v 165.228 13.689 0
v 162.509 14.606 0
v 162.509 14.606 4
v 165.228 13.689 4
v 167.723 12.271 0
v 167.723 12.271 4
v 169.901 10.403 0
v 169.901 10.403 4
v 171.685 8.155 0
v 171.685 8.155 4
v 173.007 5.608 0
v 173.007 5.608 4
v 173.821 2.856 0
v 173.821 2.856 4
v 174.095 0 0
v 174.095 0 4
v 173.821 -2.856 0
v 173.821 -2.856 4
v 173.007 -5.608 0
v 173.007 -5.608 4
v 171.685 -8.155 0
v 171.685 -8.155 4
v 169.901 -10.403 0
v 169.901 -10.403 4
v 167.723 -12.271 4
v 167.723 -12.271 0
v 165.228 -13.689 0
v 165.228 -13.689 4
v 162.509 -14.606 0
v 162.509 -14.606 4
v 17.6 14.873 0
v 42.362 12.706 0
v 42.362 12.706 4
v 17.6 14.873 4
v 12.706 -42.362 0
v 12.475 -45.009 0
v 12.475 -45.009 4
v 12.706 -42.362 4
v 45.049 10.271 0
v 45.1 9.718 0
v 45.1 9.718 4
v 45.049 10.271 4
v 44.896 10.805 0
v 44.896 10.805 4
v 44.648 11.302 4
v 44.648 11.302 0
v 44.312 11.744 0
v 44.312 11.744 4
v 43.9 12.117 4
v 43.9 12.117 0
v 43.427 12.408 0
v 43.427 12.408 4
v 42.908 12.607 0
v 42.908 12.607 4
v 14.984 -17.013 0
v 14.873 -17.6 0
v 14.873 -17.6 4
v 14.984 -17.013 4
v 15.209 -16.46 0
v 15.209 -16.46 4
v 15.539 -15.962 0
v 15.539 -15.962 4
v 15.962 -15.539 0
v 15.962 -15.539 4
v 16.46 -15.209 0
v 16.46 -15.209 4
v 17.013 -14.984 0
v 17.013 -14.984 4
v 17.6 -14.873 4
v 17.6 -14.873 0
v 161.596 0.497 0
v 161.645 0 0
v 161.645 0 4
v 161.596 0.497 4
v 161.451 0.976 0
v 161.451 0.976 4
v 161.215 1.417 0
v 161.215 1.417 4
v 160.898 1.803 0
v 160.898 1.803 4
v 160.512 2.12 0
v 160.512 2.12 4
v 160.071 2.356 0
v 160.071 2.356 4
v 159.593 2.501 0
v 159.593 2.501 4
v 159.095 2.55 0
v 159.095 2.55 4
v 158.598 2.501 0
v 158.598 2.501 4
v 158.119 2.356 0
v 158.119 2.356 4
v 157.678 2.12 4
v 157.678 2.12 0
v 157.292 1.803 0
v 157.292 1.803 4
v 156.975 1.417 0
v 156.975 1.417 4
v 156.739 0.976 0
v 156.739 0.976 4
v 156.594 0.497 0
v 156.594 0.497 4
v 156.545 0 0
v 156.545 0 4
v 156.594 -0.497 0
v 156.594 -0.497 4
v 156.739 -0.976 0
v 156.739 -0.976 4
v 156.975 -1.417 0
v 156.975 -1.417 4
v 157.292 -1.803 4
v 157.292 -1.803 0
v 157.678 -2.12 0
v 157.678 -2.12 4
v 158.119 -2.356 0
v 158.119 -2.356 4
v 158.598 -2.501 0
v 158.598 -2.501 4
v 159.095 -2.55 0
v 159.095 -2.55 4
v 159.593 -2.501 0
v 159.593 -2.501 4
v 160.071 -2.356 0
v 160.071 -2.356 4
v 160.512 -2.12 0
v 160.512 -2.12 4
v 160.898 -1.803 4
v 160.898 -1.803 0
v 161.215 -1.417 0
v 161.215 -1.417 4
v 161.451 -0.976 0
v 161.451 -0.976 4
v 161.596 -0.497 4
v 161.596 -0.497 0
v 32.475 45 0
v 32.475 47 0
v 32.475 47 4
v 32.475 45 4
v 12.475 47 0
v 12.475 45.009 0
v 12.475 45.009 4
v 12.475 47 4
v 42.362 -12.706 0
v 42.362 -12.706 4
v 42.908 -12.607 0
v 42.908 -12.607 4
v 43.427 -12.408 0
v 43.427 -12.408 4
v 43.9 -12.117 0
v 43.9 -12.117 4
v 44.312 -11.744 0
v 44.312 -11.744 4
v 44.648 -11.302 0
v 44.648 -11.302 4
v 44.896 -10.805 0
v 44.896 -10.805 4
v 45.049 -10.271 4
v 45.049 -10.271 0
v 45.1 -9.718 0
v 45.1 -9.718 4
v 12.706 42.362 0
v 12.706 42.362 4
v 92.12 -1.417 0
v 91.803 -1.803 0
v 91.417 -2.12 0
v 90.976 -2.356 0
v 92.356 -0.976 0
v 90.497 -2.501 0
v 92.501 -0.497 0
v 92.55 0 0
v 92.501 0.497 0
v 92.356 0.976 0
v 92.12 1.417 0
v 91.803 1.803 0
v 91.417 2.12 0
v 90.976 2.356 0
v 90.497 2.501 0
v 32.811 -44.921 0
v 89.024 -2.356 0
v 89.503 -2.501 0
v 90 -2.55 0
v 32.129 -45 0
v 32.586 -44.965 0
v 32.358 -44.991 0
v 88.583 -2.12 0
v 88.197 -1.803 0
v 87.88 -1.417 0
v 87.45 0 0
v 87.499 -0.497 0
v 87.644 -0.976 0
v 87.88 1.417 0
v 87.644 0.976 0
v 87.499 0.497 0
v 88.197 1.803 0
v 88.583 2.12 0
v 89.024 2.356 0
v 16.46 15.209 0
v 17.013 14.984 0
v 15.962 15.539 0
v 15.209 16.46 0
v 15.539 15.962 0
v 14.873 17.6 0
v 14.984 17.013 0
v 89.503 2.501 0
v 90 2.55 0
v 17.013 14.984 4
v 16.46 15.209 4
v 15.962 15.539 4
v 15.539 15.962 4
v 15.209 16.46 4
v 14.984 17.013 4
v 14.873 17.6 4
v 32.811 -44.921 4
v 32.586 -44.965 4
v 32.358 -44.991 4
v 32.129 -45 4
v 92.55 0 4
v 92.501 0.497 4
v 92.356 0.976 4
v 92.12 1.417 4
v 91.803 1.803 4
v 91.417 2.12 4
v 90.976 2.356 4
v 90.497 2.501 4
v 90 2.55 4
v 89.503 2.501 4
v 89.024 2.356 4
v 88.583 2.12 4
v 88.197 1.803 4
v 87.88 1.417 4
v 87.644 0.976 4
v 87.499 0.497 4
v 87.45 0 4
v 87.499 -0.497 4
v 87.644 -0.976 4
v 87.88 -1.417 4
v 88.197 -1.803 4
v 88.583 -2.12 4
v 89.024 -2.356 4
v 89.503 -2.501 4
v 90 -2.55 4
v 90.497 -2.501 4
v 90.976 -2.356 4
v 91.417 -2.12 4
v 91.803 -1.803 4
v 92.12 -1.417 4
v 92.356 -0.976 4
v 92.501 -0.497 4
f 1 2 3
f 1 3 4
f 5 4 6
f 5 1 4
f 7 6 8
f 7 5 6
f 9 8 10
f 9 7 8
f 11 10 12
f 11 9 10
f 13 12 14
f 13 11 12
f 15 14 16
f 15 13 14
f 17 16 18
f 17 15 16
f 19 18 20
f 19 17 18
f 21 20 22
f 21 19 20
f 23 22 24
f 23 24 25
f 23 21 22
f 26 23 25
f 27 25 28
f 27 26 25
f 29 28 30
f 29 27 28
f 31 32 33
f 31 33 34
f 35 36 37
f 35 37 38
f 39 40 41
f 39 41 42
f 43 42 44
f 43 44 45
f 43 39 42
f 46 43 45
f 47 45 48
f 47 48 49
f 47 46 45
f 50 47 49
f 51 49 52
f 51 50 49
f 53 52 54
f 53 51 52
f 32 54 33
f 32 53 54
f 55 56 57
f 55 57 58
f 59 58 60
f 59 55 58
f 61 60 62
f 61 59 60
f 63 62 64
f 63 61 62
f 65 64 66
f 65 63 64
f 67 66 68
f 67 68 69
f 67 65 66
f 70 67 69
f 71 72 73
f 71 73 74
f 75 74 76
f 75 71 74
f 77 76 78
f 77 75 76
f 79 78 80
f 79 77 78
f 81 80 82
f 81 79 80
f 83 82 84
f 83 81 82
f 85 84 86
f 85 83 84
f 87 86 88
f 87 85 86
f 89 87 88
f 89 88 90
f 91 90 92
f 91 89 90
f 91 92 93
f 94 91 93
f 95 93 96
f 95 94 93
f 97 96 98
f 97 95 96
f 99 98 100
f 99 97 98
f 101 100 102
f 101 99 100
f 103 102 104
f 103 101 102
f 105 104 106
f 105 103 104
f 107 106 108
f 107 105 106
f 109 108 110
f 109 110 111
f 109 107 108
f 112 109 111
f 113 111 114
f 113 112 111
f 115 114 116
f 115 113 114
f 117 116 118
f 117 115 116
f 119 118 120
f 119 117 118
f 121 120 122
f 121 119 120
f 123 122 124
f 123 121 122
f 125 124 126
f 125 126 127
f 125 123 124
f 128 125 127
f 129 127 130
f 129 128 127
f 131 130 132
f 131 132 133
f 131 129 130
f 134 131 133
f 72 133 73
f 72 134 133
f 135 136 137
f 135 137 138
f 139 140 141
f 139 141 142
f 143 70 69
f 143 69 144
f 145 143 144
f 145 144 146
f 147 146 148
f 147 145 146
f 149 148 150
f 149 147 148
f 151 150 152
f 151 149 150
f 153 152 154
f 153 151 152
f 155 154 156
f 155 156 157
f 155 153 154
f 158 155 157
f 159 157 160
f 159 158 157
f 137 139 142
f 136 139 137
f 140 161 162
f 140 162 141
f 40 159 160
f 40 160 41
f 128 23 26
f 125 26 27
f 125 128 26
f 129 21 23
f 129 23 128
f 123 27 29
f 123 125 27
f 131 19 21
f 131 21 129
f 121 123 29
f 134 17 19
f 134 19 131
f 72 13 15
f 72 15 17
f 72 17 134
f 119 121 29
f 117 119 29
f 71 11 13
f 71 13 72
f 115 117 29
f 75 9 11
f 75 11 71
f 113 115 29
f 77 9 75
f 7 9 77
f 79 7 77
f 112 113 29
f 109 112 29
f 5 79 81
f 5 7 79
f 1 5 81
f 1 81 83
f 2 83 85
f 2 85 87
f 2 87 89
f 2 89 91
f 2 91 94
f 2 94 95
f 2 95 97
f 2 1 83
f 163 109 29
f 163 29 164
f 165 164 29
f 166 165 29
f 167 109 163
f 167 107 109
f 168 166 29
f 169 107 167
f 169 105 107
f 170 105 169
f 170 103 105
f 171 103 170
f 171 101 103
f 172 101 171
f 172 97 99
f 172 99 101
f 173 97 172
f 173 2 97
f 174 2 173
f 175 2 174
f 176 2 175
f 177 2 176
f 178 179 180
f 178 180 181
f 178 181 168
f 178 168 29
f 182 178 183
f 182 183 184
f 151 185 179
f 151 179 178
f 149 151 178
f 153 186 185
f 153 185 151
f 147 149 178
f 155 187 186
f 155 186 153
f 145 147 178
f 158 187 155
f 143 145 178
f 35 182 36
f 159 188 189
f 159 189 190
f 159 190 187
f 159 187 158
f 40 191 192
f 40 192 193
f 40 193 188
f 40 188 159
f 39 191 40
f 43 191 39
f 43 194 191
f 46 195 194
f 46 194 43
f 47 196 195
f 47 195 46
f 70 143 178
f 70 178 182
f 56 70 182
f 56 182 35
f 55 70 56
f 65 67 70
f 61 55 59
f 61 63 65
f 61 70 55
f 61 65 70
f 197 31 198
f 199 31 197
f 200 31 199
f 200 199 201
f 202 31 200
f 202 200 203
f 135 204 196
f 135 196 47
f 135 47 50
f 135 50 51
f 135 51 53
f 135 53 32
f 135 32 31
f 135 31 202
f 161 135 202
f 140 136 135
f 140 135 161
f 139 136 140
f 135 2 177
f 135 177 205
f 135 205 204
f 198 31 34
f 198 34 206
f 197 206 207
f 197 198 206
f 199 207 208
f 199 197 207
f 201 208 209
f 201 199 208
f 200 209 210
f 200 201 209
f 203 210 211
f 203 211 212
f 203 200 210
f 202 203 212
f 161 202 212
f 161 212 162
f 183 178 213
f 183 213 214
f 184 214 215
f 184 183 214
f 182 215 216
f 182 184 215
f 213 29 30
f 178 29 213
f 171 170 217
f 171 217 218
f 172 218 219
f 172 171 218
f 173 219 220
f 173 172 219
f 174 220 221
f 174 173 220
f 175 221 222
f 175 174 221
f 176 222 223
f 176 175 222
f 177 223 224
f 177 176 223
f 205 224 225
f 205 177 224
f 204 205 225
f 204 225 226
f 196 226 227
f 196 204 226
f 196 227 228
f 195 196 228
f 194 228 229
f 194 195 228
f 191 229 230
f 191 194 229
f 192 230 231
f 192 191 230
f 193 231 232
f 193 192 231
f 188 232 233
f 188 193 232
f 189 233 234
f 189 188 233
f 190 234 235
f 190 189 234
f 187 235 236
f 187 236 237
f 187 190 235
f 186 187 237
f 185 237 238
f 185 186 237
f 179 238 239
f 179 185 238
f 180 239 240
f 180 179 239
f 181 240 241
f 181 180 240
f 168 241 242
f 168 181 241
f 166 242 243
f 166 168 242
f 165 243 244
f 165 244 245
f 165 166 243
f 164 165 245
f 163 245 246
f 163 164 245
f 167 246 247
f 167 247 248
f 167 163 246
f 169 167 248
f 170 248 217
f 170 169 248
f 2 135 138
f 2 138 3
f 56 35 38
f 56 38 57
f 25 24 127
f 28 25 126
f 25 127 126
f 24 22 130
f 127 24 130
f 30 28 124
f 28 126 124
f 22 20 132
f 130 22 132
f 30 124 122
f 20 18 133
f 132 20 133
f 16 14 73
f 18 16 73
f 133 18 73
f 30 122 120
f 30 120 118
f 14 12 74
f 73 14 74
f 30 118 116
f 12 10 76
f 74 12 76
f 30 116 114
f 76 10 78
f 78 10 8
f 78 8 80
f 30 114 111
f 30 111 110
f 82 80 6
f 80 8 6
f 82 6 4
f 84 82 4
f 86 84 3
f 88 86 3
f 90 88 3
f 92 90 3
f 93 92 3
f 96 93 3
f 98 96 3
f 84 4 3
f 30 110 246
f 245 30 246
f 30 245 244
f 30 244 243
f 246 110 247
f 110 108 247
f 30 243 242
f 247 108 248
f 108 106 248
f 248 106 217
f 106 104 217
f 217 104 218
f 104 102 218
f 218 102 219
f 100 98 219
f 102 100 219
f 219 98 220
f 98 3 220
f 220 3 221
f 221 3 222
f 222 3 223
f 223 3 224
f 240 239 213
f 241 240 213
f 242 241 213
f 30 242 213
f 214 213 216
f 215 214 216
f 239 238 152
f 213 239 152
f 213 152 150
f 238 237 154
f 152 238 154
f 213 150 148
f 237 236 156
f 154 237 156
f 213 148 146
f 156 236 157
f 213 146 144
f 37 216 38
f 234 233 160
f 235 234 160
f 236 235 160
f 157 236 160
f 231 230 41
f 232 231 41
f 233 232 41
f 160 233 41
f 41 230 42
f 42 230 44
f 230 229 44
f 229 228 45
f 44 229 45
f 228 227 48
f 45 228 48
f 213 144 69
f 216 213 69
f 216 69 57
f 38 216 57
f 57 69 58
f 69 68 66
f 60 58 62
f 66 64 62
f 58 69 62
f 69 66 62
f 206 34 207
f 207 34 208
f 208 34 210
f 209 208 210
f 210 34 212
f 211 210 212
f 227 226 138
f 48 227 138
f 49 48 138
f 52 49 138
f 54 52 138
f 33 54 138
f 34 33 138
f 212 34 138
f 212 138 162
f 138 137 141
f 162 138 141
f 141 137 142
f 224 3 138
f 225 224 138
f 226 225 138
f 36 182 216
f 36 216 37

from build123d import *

# Parameters (mm, degrees)
SKETCH1_R           = 2.55
BOSS_EXTRUDE1_DEPTH = 4


with BuildPart() as part:
    # Sketch1 → Boss-Extrude1 (new body)
    with BuildSketch(Plane.XY):
        with BuildLine():
            Line((14.872885109, 17.599965411), (12.706250758, 42.361500851))
            Line((12.706250758, 42.361500851), (12.474619372, 45.008716695))
            Line((12.474619372, 45.008716695), (12.474619372, 47))
            Line((12.474619372, 47), (32.474619372, 47))
            Line((32.474619372, 47), (32.474619372, 45))
            Line((32.474619372, 45), (162.509181482, 14.606317485))
            ThreePointArc((162.509181482, 14.606317485), (174.095167783, 0), (162.509181482, -14.606317485))
            Line((162.509181482, -14.606317485), (32.810836001, -44.921414266))
            ThreePointArc((32.810836001, -44.921414266), (32.472346424, -44.980326678), (32.129340765, -45.000150484))
            Line((32.129340765, -45.000150484), (12.474619372, -45.008716695))
            Line((12.474619372, -45.008716695), (12.706250758, -42.361500851))
            Line((12.706250758, -42.361500851), (14.872885109, -17.599965411))
            ThreePointArc((14.872885109, -17.599965411), (15.740145918, -15.740145918), (17.599965411, -14.872885109))
            Line((17.599965411, -14.872885109), (42.361500851, -12.706250758))
            ThreePointArc((42.361500851, -12.706250758), (44.311843411, -11.744427787), (45.1, -9.717669606))
            Line((45.1, -9.717669606), (45.1, 9.717669606))
            ThreePointArc((45.1, 9.717669606), (44.311843411, 11.744427787), (42.361500851, 12.706250758))
            Line((42.361500851, 12.706250758), (17.599965411, 14.872885109))
            ThreePointArc((17.599965411, 14.872885109), (15.740145918, 15.740145918), (14.872885109, 17.599965411))
        make_face()
        with Locations((159.095167783, 0)):
            Circle(SKETCH1_R, mode=Mode.SUBTRACT)
        with Locations((90, 0)):
            Circle(SKETCH1_R, mode=Mode.SUBTRACT)
    extrude(amount=BOSS_EXTRUDE1_DEPTH)


solid = part.part
